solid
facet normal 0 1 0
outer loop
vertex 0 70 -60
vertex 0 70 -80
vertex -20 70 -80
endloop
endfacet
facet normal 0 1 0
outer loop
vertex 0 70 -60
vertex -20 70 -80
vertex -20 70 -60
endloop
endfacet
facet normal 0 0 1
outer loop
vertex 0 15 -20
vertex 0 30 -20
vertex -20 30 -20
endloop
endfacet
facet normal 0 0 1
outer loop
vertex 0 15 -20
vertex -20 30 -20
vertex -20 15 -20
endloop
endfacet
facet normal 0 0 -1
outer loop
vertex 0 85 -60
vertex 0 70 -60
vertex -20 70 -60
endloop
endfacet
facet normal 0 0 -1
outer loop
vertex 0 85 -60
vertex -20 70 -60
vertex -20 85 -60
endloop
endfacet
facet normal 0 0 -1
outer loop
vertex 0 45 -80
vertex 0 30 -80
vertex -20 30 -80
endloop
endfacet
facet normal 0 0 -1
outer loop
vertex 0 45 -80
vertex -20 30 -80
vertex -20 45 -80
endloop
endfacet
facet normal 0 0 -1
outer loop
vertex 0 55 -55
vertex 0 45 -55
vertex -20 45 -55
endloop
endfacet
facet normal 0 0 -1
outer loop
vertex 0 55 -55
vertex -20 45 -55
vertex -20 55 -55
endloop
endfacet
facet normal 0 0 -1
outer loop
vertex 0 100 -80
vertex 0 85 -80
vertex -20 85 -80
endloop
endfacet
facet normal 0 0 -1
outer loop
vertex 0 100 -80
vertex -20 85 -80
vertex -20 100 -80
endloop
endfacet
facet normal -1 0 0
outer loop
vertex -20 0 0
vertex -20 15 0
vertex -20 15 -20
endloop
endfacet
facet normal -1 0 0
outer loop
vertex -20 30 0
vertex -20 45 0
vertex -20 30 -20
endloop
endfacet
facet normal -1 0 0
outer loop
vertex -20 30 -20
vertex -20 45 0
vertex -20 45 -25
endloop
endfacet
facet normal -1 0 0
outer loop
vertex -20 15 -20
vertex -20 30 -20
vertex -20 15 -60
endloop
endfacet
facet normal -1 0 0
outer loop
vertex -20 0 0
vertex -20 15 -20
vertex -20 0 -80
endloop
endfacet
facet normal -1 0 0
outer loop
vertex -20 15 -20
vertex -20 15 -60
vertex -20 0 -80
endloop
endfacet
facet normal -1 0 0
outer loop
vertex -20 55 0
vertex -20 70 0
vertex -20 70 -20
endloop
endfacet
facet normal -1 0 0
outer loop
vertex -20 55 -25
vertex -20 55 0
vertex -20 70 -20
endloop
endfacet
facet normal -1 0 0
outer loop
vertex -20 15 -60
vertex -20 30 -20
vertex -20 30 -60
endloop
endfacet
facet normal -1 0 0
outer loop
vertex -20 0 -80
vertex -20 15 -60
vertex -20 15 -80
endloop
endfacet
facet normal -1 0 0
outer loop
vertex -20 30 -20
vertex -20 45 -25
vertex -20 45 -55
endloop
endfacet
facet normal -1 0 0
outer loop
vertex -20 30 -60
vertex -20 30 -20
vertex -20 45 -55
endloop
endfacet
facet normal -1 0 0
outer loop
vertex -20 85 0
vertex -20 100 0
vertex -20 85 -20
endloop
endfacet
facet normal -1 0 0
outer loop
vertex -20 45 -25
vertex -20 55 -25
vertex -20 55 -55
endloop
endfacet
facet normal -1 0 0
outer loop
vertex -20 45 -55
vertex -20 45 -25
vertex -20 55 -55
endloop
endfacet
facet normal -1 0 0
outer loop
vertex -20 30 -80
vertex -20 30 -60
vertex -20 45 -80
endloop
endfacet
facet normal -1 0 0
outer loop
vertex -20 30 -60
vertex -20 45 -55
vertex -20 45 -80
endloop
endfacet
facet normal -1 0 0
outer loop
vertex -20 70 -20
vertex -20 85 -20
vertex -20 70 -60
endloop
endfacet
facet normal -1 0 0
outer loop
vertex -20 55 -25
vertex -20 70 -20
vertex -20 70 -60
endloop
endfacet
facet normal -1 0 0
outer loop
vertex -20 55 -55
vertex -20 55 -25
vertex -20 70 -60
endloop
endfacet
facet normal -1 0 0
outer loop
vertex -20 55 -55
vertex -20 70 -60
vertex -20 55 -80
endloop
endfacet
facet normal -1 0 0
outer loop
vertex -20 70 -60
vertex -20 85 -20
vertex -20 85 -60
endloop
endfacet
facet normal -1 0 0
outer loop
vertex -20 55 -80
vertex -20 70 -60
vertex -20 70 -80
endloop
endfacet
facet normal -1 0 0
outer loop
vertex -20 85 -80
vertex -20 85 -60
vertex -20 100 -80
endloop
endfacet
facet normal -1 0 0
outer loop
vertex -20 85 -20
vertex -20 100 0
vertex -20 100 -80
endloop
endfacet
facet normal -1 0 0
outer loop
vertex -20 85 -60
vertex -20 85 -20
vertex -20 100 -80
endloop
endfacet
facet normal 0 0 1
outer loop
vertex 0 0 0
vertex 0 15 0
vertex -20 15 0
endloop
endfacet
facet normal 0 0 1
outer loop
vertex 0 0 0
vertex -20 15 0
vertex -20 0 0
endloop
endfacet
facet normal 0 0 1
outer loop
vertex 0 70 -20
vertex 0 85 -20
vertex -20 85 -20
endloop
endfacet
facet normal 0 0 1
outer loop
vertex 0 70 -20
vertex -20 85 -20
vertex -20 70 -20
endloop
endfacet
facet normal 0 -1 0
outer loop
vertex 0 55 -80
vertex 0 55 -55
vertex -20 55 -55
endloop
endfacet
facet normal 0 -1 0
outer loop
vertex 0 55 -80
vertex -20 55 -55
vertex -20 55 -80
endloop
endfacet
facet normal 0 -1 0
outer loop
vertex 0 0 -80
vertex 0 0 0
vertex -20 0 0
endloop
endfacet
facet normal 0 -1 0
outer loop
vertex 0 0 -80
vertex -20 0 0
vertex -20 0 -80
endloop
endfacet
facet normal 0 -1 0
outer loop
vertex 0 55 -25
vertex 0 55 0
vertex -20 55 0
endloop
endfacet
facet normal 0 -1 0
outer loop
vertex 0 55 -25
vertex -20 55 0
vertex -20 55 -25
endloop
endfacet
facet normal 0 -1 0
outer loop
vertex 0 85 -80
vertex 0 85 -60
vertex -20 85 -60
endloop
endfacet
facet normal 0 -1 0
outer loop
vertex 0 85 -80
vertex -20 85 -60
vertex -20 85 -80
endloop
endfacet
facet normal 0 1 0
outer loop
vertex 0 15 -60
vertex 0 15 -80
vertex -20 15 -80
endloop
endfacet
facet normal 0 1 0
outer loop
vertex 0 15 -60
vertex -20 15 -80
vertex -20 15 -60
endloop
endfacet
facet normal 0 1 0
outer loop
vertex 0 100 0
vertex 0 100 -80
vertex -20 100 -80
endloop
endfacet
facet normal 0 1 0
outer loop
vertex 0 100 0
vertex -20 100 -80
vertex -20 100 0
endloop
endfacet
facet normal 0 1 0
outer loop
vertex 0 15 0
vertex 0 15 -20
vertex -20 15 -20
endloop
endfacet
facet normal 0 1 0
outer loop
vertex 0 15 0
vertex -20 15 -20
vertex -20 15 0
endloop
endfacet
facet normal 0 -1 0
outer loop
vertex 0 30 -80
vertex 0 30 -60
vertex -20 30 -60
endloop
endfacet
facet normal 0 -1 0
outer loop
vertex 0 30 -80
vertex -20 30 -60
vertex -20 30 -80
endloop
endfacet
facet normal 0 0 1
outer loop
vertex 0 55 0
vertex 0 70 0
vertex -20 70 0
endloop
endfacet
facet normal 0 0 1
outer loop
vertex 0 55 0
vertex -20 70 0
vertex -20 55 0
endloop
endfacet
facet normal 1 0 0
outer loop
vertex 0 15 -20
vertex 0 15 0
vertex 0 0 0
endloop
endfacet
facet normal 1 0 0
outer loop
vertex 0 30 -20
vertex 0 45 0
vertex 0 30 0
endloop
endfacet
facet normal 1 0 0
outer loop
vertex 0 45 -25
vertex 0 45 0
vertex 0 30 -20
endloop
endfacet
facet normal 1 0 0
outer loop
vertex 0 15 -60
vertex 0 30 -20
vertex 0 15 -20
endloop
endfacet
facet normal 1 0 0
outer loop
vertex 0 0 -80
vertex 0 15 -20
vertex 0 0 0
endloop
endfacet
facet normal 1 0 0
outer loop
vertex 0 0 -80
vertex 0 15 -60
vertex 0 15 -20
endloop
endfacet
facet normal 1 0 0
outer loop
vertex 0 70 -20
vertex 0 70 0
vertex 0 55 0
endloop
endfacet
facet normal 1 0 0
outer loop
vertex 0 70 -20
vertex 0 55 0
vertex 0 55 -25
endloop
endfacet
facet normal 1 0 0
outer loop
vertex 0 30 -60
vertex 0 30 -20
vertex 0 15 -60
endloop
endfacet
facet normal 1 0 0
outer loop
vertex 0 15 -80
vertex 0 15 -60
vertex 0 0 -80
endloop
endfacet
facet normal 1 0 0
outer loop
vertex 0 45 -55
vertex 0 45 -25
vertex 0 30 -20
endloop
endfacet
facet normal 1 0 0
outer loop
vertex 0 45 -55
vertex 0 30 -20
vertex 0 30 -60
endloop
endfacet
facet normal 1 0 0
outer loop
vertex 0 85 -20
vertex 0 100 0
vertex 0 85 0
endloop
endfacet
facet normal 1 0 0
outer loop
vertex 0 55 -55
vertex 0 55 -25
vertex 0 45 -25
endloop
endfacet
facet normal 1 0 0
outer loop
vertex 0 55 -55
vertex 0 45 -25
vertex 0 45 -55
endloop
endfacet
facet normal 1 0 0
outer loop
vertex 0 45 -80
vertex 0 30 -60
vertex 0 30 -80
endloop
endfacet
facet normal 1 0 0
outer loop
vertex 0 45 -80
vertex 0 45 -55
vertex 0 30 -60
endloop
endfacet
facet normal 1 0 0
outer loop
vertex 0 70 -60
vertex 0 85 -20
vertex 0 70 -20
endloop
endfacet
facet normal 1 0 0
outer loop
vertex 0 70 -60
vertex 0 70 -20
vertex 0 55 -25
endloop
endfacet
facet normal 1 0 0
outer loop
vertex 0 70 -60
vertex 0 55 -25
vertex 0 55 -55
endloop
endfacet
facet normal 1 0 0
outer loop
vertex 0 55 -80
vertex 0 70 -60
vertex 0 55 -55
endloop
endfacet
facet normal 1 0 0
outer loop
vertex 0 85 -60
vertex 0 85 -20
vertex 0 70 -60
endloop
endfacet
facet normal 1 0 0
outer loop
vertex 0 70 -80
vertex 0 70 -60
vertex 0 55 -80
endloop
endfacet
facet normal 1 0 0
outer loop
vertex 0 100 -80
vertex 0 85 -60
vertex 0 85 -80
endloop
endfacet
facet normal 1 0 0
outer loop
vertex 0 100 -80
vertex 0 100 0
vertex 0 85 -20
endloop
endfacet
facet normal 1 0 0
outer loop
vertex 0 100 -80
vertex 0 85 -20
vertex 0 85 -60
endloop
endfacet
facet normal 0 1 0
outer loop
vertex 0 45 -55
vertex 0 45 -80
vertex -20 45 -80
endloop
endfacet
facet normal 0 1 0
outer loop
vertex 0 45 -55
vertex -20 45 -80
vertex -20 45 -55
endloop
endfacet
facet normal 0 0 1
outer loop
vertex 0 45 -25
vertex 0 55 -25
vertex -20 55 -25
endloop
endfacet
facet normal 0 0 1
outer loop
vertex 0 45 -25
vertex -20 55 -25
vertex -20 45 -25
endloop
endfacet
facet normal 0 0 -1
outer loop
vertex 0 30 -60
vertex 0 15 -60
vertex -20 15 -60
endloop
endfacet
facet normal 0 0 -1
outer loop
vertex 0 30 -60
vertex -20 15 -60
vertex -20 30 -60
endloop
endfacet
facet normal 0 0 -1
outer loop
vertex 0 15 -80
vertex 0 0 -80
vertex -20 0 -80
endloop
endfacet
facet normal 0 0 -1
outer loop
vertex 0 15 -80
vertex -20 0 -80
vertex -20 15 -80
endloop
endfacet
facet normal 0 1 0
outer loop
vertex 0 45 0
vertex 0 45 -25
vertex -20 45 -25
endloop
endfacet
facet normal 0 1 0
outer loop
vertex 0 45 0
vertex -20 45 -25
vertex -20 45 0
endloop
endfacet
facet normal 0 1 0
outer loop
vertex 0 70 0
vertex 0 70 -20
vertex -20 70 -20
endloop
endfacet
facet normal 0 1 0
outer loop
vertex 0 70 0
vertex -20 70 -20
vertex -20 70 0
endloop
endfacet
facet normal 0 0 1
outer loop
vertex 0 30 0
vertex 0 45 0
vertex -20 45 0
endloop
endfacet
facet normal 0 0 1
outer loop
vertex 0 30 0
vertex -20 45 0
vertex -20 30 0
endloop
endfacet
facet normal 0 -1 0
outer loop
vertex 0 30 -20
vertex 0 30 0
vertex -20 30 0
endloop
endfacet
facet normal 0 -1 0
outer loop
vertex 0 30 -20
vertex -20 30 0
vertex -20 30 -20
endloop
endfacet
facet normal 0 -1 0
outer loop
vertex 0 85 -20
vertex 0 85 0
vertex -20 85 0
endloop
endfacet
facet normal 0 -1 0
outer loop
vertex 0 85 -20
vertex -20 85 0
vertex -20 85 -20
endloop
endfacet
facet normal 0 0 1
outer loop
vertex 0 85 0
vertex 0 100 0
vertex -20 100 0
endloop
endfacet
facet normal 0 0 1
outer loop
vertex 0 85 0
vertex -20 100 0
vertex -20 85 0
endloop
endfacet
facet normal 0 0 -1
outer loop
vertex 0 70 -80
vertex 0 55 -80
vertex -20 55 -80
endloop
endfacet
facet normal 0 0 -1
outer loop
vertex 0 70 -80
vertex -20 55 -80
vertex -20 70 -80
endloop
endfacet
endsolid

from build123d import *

# Parameters (mm, degrees)
BOSS_EXTRUDE1_DEPTH = 20


with BuildPart() as part:
    # Sketch2 → Boss-Extrude1 (new body)
    with BuildSketch(Plane(origin=(0, 0, 0), x_dir=(0, 0, -1), z_dir=(1, 0, 0))):
        Polygon((0, 0), (80, 0), (80, 15), (60, 15), (60, 30), (80, 30), (80, 45), (55, 45), (55, 55), (80, 55), (80, 70), (60, 70), (60, 85), (80, 85), (80, 100), (0, 100), (0, 85), (20, 85), (20, 70), (0, 70), (0, 55), (25, 55), (25, 45), (0, 45), (0, 30), (20, 30), (20, 15), (0, 15), align=None)
    extrude(amount=-BOSS_EXTRUDE1_DEPTH)


solid = part.part
